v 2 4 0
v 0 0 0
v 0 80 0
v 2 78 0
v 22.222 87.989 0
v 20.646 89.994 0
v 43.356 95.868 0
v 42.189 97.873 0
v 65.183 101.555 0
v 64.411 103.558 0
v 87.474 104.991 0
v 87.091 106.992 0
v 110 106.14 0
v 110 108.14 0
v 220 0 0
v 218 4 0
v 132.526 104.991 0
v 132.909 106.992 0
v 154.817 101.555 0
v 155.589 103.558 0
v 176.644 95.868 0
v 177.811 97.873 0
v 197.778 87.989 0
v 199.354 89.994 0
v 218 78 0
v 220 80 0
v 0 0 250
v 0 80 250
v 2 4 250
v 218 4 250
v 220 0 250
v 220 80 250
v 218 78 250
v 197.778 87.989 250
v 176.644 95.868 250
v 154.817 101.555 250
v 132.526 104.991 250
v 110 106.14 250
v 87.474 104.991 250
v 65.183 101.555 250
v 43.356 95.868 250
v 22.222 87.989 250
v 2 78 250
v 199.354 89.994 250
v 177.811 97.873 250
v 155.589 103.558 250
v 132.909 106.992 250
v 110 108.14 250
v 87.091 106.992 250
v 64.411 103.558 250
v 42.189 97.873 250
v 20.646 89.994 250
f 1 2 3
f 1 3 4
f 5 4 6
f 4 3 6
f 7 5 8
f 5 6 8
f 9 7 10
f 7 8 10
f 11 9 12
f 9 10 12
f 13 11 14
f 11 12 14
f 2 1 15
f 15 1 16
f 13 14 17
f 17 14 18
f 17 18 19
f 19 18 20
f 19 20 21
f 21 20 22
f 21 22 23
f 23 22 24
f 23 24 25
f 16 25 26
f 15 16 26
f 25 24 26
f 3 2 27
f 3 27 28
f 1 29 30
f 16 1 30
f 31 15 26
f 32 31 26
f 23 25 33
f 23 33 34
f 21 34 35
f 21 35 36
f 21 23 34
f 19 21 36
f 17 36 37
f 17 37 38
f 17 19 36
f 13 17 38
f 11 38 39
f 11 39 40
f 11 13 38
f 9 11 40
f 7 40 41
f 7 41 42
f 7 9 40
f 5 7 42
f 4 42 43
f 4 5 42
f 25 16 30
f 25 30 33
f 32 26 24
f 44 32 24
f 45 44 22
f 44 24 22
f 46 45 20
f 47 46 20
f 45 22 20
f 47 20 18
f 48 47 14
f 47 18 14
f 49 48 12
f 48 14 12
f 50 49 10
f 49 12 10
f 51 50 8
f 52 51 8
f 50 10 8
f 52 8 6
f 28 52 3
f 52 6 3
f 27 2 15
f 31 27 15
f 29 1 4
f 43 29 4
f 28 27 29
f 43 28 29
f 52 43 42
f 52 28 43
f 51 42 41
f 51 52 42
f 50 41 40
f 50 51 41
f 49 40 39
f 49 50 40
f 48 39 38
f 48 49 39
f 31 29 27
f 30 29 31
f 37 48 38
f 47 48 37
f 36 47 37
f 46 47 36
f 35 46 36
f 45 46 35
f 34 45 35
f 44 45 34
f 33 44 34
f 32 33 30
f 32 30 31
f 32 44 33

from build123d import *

# Parameters (mm, degrees)
PAD_DEPTH = 250


with BuildPart() as part:
    # Sketch → Pad (new body)
    with BuildSketch(Plane.XY):
        with BuildLine():
            Line((0, 0), (220, 0))
            Line((220, 0), (220, 80))
            ThreePointArc((220, 80), (110, 108.140114), (0, 80))
            Line((0, 0), (0, 80))
        make_face()
        with BuildLine():
            Line((2, 4), (218, 4))
            Line((218, 4), (218, 78))
            ThreePointArc((218, 78), (110, 106.140114), (2, 78))
            Line((2, 4), (2, 78))
        make_face(mode=Mode.SUBTRACT)
    extrude(amount=PAD_DEPTH)


solid = part.part
